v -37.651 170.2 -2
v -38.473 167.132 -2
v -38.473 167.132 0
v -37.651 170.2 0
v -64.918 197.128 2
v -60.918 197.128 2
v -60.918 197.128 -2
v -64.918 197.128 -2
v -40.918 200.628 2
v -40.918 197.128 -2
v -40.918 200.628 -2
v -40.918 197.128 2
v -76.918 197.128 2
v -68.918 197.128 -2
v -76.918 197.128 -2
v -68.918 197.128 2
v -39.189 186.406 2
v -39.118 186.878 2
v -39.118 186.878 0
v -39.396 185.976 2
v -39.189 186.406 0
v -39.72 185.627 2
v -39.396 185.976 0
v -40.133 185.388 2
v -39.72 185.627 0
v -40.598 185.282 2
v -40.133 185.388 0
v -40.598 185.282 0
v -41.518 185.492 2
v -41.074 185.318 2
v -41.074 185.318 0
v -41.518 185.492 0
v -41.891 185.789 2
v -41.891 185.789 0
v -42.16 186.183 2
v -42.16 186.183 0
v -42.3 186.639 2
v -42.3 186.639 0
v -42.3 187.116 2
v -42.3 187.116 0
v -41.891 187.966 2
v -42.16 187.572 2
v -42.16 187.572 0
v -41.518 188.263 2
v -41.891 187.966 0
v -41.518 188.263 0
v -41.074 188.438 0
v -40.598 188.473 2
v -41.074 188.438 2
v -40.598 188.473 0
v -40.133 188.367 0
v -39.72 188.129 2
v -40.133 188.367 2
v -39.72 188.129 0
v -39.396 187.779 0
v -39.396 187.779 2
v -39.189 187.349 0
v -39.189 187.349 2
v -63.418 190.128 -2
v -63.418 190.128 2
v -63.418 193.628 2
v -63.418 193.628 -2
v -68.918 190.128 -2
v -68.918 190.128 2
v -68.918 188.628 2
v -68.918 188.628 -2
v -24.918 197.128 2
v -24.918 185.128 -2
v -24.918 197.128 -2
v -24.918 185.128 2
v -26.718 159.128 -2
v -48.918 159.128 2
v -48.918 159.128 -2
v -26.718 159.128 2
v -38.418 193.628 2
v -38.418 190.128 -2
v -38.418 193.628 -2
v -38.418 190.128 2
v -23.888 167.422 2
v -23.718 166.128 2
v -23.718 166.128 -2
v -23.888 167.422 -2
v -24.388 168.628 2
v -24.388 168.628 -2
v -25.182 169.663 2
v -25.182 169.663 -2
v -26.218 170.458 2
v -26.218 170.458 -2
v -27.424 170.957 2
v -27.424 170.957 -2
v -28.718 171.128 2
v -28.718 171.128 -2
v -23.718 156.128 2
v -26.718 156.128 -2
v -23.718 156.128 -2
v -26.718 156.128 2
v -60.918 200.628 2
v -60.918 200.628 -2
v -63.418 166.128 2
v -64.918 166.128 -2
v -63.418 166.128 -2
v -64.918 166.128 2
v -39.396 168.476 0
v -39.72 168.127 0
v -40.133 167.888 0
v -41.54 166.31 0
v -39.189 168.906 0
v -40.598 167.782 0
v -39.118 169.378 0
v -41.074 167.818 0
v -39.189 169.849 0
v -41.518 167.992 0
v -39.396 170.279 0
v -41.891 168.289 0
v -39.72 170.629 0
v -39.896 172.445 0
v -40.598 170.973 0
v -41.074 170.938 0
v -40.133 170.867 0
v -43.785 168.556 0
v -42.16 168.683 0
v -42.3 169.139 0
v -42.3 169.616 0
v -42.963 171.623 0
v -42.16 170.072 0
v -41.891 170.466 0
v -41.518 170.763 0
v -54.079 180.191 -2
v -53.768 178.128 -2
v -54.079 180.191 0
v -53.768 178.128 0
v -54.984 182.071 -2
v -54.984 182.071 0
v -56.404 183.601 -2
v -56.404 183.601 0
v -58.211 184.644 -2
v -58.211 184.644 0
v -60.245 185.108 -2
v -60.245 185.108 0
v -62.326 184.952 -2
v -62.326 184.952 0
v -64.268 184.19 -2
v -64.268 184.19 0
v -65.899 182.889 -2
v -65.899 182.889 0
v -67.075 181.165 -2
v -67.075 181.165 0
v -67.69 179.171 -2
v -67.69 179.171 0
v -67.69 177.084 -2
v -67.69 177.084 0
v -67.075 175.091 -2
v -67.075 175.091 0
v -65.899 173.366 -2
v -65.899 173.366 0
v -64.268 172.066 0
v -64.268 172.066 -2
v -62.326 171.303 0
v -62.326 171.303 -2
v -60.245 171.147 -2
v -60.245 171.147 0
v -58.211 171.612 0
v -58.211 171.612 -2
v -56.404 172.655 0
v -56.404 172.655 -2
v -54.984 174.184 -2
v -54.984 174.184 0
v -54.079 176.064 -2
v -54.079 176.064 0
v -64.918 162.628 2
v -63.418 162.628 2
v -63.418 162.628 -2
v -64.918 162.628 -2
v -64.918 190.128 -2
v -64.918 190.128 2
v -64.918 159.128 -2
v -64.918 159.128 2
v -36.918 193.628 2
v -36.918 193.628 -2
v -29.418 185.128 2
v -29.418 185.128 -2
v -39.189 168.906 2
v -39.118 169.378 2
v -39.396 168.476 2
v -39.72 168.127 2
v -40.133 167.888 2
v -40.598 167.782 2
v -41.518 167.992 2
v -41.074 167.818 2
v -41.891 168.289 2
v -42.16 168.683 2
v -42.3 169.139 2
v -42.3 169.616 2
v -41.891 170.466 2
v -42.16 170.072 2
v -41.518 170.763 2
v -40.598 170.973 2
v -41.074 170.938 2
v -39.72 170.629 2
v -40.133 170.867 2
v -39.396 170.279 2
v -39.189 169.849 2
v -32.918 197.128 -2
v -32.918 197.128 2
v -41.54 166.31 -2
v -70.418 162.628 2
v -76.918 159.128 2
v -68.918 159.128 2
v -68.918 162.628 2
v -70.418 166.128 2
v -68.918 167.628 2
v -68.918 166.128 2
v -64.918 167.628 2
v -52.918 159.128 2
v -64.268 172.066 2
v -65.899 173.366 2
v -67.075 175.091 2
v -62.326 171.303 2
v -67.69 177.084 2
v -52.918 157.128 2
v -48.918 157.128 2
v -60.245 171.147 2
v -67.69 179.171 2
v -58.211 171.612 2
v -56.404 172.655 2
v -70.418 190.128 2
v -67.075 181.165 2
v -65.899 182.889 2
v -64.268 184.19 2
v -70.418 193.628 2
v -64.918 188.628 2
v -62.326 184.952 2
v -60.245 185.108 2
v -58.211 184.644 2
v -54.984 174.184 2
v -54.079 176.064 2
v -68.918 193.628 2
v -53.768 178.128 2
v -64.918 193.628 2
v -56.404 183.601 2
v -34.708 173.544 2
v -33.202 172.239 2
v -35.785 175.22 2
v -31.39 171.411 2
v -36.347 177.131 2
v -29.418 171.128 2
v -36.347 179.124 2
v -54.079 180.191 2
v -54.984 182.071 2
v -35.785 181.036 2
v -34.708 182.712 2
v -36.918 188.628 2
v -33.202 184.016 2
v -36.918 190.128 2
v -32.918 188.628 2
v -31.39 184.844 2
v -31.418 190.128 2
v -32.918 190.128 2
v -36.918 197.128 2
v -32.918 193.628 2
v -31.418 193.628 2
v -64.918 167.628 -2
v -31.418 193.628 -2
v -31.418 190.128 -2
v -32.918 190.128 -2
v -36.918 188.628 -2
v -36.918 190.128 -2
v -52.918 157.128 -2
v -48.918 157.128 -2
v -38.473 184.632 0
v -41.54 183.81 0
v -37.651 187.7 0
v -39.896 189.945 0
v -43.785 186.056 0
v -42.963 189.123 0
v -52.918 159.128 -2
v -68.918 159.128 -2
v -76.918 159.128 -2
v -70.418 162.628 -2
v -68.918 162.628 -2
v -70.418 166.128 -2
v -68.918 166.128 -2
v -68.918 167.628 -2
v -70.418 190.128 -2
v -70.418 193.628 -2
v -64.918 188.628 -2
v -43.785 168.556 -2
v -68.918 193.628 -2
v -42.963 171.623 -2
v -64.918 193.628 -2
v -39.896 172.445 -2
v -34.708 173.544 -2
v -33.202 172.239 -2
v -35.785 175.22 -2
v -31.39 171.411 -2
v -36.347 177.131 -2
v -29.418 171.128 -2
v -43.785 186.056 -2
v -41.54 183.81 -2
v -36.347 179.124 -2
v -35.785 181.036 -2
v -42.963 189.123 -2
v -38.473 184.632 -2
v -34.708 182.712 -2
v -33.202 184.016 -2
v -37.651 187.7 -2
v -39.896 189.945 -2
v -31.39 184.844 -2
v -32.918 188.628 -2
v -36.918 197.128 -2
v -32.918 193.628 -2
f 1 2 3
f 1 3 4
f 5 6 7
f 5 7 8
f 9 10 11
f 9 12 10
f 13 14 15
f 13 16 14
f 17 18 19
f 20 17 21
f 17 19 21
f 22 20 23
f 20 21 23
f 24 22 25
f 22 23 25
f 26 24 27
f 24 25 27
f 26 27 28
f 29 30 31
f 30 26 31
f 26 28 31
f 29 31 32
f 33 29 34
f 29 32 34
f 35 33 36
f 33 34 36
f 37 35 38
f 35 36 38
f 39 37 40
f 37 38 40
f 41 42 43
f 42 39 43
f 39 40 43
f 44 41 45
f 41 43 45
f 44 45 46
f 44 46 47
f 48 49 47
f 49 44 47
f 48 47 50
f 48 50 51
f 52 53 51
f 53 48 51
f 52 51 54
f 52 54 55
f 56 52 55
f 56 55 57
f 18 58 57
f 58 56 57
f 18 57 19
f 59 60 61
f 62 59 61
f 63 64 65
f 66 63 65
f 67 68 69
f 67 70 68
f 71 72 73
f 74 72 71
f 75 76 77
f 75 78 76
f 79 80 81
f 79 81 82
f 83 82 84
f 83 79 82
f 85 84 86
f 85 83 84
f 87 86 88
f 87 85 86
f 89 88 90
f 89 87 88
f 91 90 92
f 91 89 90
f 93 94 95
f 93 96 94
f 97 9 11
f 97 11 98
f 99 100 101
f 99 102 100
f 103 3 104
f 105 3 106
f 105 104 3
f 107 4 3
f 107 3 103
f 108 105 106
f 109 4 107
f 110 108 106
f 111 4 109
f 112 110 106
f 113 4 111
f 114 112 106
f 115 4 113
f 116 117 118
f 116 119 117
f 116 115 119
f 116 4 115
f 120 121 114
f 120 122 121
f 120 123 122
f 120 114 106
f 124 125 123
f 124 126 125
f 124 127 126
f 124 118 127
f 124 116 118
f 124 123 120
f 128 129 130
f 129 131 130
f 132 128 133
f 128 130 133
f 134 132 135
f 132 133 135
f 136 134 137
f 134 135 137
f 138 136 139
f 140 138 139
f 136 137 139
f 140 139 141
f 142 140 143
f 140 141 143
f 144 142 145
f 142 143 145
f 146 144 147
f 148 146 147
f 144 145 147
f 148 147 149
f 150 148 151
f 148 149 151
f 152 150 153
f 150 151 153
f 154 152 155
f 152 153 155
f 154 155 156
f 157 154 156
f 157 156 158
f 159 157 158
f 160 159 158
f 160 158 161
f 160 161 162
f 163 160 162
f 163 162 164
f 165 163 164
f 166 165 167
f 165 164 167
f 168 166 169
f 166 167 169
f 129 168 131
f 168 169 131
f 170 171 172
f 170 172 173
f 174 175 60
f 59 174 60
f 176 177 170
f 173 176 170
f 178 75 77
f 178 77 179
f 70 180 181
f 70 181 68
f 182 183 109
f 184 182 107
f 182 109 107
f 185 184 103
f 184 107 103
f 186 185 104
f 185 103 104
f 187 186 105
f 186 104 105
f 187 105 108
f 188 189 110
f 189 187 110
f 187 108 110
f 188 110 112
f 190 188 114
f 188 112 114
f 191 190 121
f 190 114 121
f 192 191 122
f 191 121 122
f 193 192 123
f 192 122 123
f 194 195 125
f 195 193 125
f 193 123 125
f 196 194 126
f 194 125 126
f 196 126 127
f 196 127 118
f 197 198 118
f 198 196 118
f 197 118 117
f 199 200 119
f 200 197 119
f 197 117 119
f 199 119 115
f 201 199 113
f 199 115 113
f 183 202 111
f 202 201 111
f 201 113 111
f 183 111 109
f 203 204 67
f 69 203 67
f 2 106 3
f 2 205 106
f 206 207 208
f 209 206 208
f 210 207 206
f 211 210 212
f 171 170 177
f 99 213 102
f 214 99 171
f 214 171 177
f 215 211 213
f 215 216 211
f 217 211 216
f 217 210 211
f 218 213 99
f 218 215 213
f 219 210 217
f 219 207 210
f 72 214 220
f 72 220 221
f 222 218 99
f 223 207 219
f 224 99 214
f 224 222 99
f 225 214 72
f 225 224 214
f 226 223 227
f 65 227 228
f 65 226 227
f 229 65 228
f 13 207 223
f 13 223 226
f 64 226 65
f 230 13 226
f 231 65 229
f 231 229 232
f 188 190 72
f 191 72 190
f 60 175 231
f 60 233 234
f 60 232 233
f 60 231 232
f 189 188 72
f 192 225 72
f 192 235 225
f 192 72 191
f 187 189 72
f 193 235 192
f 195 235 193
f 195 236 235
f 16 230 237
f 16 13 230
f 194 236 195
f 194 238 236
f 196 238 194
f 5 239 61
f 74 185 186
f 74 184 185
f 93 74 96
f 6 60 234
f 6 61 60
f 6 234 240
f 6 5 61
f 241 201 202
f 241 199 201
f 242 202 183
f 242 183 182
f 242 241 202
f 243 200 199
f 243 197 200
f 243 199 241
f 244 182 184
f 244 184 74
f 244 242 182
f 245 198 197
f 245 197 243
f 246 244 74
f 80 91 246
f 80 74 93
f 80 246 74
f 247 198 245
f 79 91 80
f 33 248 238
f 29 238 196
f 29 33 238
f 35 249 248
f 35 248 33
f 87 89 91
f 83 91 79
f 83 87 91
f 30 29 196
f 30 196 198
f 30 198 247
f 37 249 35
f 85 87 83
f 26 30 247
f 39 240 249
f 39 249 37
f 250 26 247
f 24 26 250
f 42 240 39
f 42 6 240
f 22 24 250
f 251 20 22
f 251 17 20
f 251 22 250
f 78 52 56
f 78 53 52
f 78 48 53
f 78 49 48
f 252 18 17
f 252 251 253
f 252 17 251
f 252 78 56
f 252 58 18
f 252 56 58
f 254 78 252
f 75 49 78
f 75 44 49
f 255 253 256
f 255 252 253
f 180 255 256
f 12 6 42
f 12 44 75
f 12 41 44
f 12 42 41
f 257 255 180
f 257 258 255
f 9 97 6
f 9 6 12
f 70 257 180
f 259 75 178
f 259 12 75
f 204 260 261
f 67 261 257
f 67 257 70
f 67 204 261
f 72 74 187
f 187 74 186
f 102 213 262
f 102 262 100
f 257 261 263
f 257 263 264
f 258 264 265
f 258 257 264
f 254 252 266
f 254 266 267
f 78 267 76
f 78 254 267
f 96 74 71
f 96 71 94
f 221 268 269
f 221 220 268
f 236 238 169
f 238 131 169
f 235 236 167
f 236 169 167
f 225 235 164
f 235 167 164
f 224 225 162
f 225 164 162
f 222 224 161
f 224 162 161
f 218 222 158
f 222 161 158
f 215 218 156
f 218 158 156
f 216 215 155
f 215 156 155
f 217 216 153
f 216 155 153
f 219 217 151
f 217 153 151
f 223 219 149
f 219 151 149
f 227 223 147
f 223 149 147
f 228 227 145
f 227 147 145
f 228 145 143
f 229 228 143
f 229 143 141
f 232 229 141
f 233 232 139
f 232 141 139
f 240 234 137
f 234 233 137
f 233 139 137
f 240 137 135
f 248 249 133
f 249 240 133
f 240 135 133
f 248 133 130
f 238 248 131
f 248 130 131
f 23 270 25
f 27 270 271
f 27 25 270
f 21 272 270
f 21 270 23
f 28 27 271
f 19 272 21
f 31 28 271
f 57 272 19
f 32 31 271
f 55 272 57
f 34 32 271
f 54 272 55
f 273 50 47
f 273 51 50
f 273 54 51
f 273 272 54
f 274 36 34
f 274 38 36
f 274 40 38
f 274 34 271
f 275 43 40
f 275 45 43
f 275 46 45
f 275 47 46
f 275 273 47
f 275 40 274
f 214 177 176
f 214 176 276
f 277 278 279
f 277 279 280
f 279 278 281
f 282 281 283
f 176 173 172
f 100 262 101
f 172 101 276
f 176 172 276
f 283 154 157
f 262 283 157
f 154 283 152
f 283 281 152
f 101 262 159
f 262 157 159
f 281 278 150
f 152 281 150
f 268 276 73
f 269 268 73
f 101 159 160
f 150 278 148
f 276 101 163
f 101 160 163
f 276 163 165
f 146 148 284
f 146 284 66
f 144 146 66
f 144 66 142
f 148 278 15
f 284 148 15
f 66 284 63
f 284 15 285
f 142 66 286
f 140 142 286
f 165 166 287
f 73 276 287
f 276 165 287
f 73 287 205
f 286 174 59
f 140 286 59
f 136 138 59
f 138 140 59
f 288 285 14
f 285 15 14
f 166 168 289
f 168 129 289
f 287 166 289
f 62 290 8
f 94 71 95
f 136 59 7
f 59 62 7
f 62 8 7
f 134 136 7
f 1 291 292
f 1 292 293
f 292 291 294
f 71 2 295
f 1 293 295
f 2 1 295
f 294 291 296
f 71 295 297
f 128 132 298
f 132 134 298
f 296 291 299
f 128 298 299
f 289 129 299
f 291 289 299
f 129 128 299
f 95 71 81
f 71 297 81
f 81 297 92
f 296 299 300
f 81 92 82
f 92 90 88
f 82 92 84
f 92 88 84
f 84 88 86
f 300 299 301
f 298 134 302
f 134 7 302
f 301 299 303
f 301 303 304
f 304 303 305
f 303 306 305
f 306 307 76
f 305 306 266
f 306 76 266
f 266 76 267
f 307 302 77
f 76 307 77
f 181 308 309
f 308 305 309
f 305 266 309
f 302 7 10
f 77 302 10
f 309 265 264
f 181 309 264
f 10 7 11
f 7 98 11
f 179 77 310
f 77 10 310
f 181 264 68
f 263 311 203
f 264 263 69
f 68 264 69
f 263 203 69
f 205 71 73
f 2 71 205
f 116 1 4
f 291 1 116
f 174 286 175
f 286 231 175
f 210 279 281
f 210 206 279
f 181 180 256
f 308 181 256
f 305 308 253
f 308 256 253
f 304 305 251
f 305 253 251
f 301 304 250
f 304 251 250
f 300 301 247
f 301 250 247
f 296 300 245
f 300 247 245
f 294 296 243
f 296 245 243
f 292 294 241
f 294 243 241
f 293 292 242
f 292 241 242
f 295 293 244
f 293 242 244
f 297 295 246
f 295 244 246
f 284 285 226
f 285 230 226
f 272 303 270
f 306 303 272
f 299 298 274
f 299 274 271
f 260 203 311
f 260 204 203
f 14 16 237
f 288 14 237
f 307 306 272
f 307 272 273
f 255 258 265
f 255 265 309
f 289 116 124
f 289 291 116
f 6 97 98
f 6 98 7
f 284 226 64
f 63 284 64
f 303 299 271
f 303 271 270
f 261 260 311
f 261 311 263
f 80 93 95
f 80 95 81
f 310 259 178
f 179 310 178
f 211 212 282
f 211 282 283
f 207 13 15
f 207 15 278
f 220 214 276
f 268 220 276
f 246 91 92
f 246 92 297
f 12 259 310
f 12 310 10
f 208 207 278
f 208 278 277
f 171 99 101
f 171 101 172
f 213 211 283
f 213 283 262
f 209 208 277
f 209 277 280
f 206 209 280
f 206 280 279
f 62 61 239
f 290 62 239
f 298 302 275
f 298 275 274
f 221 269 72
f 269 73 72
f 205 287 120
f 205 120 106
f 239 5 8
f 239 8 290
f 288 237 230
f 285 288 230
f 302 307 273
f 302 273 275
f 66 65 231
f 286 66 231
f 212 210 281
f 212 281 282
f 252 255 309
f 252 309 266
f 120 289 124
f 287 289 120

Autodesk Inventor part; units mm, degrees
ref_plane "YZ Plane" through (0, 0, 0) normal (1, 0, 0) x (0, 1, 0)
ref_plane "XZ Plane" through (0, 0, 0) normal (0, 1, 0) x (-1, 0, 0)
ref_plane "XY Plane" through (0, 0, 0) normal (0, 0, 1) x (1, 0, 0)
sketch "Skizze1" plane through (0, 0, 0) normal (0, 0, 1) x (1, 0, 0)
  circle A0 centre (-60.768, 178.1277) radius 7
  circle A1 centre (-40.718, 169.3777) radius 1.6
  circle A2 centre (-40.718, 186.8777) radius 1.6
  line L0 (-23.718, 156.1277) -> (-23.718, 166.1277)
  arc A3 (-23.718, 166.1277) -> (-28.718, 171.1277) centre (-28.718, 166.1277) ccw
  line L1 (-28.718, 171.1277) -> (-29.418, 171.1277)
  arc A4 (-29.418, 185.1277) -> (-29.418, 171.1277) centre (-29.418, 178.1277) ccw
  line L2 (-40.918, 197.1277) -> (-40.918, 200.6277)
  line L3 (-40.918, 200.6277) -> (-60.918, 200.6277)
  line L4 (-68.918, 197.1277) -> (-76.918, 197.1277)
  line L5 (-76.918, 197.1277) -> (-76.918, 159.1277)
  line L6 (-76.918, 159.1277) -> (-68.918, 159.1277)
  line L7 (-64.918, 159.1277) -> (-26.718, 159.1277)
  line L8 (-26.718, 159.1277) -> (-26.718, 156.1277)
  line L9 (-26.718, 156.1277) -> (-23.718, 156.1277)
  line L10 (-36.5327, 178.1277) -> (-67.768, 178.1277) construction
  line L11 (-40.718, 169.3777) -> (-40.718, 186.8777) construction
  line L12 (-32.918, 197.1277) -> (-32.918, 193.6277)
  line L13 (-32.918, 193.6277) -> (-31.418, 193.6277)
  line L14 (-31.418, 193.6277) -> (-31.418, 190.1277)
  line L15 (-31.418, 190.1277) -> (-32.918, 190.1277)
  line L16 (-32.918, 190.1277) -> (-32.918, 188.6277)
  line L17 (-32.918, 188.6277) -> (-36.918, 188.6277)
  line L18 (-36.918, 188.6277) -> (-36.918, 190.1277)
  line L19 (-36.918, 190.1277) -> (-38.418, 190.1277)
  line L20 (-38.418, 190.1277) -> (-38.418, 193.6277)
  line L21 (-38.418, 193.6277) -> (-36.918, 193.6277)
  line L22 (-36.918, 197.1277) -> (-36.918, 193.6277)
  line L23 (-34.918, 197.9429) -> (-34.918, 190.1833) construction
  line L24 (-32.918, 197.1277) -> (-24.918, 197.1277)
  line L25 (-50.918, 190.3199) -> (-50.918, 199.5586) construction
  line L26 (-68.918, 190.1277) -> (-68.918, 188.6277)
  line L27 (-66.918, 197.9429) -> (-66.918, 190.1833) construction
  line L28 (-64.918, 197.1277) -> (-64.918, 193.6277)
  line L29 (-68.918, 188.6277) -> (-64.918, 188.6277)
  line L30 (-63.418, 193.6277) -> (-64.918, 193.6277)
  line L31 (-63.418, 190.1277) -> (-63.418, 193.6277)
  line L32 (-64.918, 188.6277) -> (-64.918, 190.1277)
  line L33 (-64.918, 190.1277) -> (-63.418, 190.1277)
  line L34 (-70.418, 190.1277) -> (-68.918, 190.1277)
  line L35 (-68.918, 193.6277) -> (-70.418, 193.6277)
  line L36 (-70.418, 193.6277) -> (-70.418, 190.1277)
  line L37 (-68.918, 197.1277) -> (-68.918, 193.6277)
  line L38 (-29.418, 185.1277) -> (-24.918, 185.1277)
  line L39 (-24.918, 185.1277) -> (-24.918, 197.1277)
  line L40 (-60.918, 200.6277) -> (-60.918, 197.1277)
  line L41 (-36.918, 197.1277) -> (-40.918, 197.1277)
  line L42 (-60.918, 197.1277) -> (-64.918, 197.1277)
  line L43 (-68.918, 162.6277) -> (-70.418, 162.6277)
  line L44 (-70.418, 162.6277) -> (-70.418, 166.1277)
  line L45 (-70.418, 166.1277) -> (-68.918, 166.1277)
  line L46 (-68.918, 166.1277) -> (-68.918, 167.6277)
  line L47 (-68.918, 167.6277) -> (-64.918, 167.6277)
  line L48 (-64.918, 167.6277) -> (-64.918, 166.1277)
  line L49 (-64.918, 166.1277) -> (-63.418, 166.1277)
  line L50 (-63.418, 166.1277) -> (-63.418, 162.6277)
  line L51 (-63.418, 162.6277) -> (-64.918, 162.6277)
  line L52 (-64.918, 159.1277) -> (-64.918, 162.6277)
  line L53 (-68.918, 159.1277) -> (-68.918, 162.6277)
  circle A5 centre (-49.518, 178.1277) radius 1.95
  point P0 (0, 0)
  point P1 (-56.218, 159.1277)
  point P2 (-36.918, 159.1277)
  point P3 (-40.718, 178.1277)
  dimension "d51" = 14
  dimension "d4" = 14
  dimension "d5" = 3
  dimension "d7" = 5
  dimension "d8" = 7
  dimension "d9" = 4.3
  dimension "d27" = 32
  dimension "d28" = 10
  dimension "d31" = 10
  dimension "d33" = 20
  dimension "d34" = 3.5
  dimension "d37" = 4
  dimension "d38" = 7
  dimension "d39" = 3.5
  dimension "d40" = 3.5
  dimension "d41" = 1.5
  dimension "d42" = 5.8
  dimension "d43" = 22.5
  dimension "d45" = 3
  dimension "d49" = 11.25
  dimension "d50" = 3.9
extrude "Extrusion1" add sketch "Skizze1" along normal mid plane 4 contours L9 L8 L7 L52 L51 L50 L49 L48 L47 L46 L45 L44 L43 L53 L6 L5 L4 L37 L35 L36 L34 L26 L29 L32 L33 L31 L30 L28 L42 L40 L3 L2 L41 L22 L21 L20 L19 L18 L17 L16 L15 L14 L13 L12 L24 L39 L38 A4 L1 A3 L0 | A5
sketch "Skizze2" plane through (0, 0, -2) normal (0, 0, -1) x (-1, 0, 0)
  circle A0 centre (60.768, 178.1277) radius 7 projected
  circle A1 centre (40.718, 186.8777) radius 1.6 projected
  circle A2 centre (40.718, 169.3777) radius 1.6 projected
  line L0 (23.718, 166.1277) -> (23.718, 156.1277) projected
  line L1 (23.718, 156.1277) -> (26.718, 156.1277) projected
  line L2 (26.718, 156.1277) -> (26.718, 159.1277) projected
  line L3 (26.718, 159.1277) -> (64.918, 159.1277) projected
  line L4 (64.918, 159.1277) -> (64.918, 162.6277) projected
  line L5 (64.918, 162.6277) -> (63.418, 162.6277) projected
  line L6 (63.418, 162.6277) -> (63.418, 166.1277) projected
  line L7 (63.418, 166.1277) -> (64.918, 166.1277) projected
  line L8 (64.918, 166.1277) -> (64.918, 167.6277) projected
  line L9 (64.918, 167.6277) -> (68.918, 167.6277) projected
  line L10 (68.918, 167.6277) -> (68.918, 166.1277) projected
  line L11 (68.918, 166.1277) -> (70.418, 166.1277) projected
  line L12 (70.418, 166.1277) -> (70.418, 162.6277) projected
  line L13 (70.418, 162.6277) -> (68.918, 162.6277) projected
  line L14 (68.918, 162.6277) -> (68.918, 159.1277) projected
  line L15 (68.918, 159.1277) -> (76.918, 159.1277) projected
  line L16 (76.918, 159.1277) -> (76.918, 197.1277) projected
  line L17 (76.918, 197.1277) -> (68.918, 197.1277) projected
  line L18 (68.918, 197.1277) -> (68.918, 193.6277) projected
  line L19 (68.918, 193.6277) -> (70.418, 193.6277) projected
  line L20 (70.418, 193.6277) -> (70.418, 190.1277) projected
  line L21 (70.418, 190.1277) -> (68.918, 190.1277) projected
  line L22 (68.918, 190.1277) -> (68.918, 188.6277) projected
  line L23 (68.918, 188.6277) -> (64.918, 188.6277) projected
  line L24 (64.918, 188.6277) -> (64.918, 190.1277) projected
  line L25 (64.918, 190.1277) -> (63.418, 190.1277) projected
  line L26 (63.418, 190.1277) -> (63.418, 193.6277) projected
  line L27 (63.418, 193.6277) -> (64.918, 193.6277) projected
  line L28 (64.918, 193.6277) -> (64.918, 197.1277) projected
  line L29 (64.918, 197.1277) -> (60.918, 197.1277) projected
  line L30 (60.918, 197.1277) -> (60.918, 200.6277) projected
  line L31 (60.918, 200.6277) -> (40.918, 200.6277) projected
  line L32 (40.918, 200.6277) -> (40.918, 197.1277) projected
  line L33 (40.918, 197.1277) -> (36.918, 197.1277) projected
  line L34 (36.918, 197.1277) -> (36.918, 193.6277) projected
  line L35 (36.918, 193.6277) -> (38.418, 193.6277) projected
  line L36 (38.418, 193.6277) -> (38.418, 190.1277) projected
  line L37 (38.418, 190.1277) -> (36.918, 190.1277) projected
  line L38 (36.918, 190.1277) -> (36.918, 188.6277) projected
  line L39 (36.918, 188.6277) -> (32.918, 188.6277) projected
  line L40 (32.918, 188.6277) -> (32.918, 190.1277) projected
  line L41 (32.918, 190.1277) -> (31.418, 190.1277) projected
  line L42 (31.418, 190.1277) -> (31.418, 193.6277) projected
  line L43 (31.418, 193.6277) -> (32.918, 193.6277) projected
  line L44 (32.918, 193.6277) -> (32.918, 197.1277) projected
  line L45 (32.918, 197.1277) -> (24.918, 197.1277) projected
  line L46 (24.918, 197.1277) -> (24.918, 185.1277) projected
  line L47 (24.918, 185.1277) -> (29.418, 185.1277) projected
  arc A3 (29.418, 171.1277) -> (29.418, 185.1277) centre (29.418, 178.1277) ccw projected
  line L48 (29.418, 171.1277) -> (28.718, 171.1277) projected
  arc A4 (28.718, 171.1277) -> (23.718, 166.1277) centre (28.718, 166.1277) ccw projected
  circle A5 centre (40.718, 169.3777) radius 1.6 projected
  line L49 (42.9634, 171.623) -> (43.7853, 168.5558)
  line L50 (43.7853, 168.5558) -> (41.5399, 166.3104)
  line L51 (41.5399, 166.3104) -> (38.4727, 167.1323)
  line L52 (38.4727, 167.1323) -> (37.6508, 170.1995)
  line L53 (37.6508, 170.1995) -> (39.8962, 172.4449)
  line L54 (39.8962, 172.4449) -> (42.9634, 171.623)
  line L55 (42.9634, 189.123) -> (43.7853, 186.0558)
  line L56 (43.7853, 186.0558) -> (41.5399, 183.8104)
  line L57 (41.5399, 183.8104) -> (38.4727, 184.6323)
  line L58 (38.4727, 184.6323) -> (37.6508, 187.6995)
  line L59 (37.6508, 187.6995) -> (39.8962, 189.9449)
  line L60 (39.8962, 189.9449) -> (42.9634, 189.123)
  line L61 (38.418, 190.1277) -> (36.918, 188.6277) construction
  point P0 (0, 0)
  dimension "d52" = 5.5
extrude "Extrusion2" cut sketch "Skizze2" against normal blind 2 contours L49 L50 L51 L52 L53 L54 | L55 L56 L57 L58 L59 L60
sketch "Skizze3" plane through (-64.918, 159.1277, 2) normal (0, -1, 0) x (1, 0, 0)
  line L0 (0, 0) -> (38.2, 0) projected
  line L1 (12, -4) -> (16, -4)
  line L2 (16, -4) -> (16, 0)
  line L3 (16, 0) -> (12, 0)
  line L4 (12, 0) -> (12, -4)
  line L5 (-12, -4) -> (-12, 0) projected
  point P0 (64.918, -2)
  point P1 (-2, -2)
  dimension "d55" = 4
  dimension "d57" = 24
extrude "Extrusion3" add sketch "Skizze3" along normal blind 2
properties part number "Motorhalter_links"
